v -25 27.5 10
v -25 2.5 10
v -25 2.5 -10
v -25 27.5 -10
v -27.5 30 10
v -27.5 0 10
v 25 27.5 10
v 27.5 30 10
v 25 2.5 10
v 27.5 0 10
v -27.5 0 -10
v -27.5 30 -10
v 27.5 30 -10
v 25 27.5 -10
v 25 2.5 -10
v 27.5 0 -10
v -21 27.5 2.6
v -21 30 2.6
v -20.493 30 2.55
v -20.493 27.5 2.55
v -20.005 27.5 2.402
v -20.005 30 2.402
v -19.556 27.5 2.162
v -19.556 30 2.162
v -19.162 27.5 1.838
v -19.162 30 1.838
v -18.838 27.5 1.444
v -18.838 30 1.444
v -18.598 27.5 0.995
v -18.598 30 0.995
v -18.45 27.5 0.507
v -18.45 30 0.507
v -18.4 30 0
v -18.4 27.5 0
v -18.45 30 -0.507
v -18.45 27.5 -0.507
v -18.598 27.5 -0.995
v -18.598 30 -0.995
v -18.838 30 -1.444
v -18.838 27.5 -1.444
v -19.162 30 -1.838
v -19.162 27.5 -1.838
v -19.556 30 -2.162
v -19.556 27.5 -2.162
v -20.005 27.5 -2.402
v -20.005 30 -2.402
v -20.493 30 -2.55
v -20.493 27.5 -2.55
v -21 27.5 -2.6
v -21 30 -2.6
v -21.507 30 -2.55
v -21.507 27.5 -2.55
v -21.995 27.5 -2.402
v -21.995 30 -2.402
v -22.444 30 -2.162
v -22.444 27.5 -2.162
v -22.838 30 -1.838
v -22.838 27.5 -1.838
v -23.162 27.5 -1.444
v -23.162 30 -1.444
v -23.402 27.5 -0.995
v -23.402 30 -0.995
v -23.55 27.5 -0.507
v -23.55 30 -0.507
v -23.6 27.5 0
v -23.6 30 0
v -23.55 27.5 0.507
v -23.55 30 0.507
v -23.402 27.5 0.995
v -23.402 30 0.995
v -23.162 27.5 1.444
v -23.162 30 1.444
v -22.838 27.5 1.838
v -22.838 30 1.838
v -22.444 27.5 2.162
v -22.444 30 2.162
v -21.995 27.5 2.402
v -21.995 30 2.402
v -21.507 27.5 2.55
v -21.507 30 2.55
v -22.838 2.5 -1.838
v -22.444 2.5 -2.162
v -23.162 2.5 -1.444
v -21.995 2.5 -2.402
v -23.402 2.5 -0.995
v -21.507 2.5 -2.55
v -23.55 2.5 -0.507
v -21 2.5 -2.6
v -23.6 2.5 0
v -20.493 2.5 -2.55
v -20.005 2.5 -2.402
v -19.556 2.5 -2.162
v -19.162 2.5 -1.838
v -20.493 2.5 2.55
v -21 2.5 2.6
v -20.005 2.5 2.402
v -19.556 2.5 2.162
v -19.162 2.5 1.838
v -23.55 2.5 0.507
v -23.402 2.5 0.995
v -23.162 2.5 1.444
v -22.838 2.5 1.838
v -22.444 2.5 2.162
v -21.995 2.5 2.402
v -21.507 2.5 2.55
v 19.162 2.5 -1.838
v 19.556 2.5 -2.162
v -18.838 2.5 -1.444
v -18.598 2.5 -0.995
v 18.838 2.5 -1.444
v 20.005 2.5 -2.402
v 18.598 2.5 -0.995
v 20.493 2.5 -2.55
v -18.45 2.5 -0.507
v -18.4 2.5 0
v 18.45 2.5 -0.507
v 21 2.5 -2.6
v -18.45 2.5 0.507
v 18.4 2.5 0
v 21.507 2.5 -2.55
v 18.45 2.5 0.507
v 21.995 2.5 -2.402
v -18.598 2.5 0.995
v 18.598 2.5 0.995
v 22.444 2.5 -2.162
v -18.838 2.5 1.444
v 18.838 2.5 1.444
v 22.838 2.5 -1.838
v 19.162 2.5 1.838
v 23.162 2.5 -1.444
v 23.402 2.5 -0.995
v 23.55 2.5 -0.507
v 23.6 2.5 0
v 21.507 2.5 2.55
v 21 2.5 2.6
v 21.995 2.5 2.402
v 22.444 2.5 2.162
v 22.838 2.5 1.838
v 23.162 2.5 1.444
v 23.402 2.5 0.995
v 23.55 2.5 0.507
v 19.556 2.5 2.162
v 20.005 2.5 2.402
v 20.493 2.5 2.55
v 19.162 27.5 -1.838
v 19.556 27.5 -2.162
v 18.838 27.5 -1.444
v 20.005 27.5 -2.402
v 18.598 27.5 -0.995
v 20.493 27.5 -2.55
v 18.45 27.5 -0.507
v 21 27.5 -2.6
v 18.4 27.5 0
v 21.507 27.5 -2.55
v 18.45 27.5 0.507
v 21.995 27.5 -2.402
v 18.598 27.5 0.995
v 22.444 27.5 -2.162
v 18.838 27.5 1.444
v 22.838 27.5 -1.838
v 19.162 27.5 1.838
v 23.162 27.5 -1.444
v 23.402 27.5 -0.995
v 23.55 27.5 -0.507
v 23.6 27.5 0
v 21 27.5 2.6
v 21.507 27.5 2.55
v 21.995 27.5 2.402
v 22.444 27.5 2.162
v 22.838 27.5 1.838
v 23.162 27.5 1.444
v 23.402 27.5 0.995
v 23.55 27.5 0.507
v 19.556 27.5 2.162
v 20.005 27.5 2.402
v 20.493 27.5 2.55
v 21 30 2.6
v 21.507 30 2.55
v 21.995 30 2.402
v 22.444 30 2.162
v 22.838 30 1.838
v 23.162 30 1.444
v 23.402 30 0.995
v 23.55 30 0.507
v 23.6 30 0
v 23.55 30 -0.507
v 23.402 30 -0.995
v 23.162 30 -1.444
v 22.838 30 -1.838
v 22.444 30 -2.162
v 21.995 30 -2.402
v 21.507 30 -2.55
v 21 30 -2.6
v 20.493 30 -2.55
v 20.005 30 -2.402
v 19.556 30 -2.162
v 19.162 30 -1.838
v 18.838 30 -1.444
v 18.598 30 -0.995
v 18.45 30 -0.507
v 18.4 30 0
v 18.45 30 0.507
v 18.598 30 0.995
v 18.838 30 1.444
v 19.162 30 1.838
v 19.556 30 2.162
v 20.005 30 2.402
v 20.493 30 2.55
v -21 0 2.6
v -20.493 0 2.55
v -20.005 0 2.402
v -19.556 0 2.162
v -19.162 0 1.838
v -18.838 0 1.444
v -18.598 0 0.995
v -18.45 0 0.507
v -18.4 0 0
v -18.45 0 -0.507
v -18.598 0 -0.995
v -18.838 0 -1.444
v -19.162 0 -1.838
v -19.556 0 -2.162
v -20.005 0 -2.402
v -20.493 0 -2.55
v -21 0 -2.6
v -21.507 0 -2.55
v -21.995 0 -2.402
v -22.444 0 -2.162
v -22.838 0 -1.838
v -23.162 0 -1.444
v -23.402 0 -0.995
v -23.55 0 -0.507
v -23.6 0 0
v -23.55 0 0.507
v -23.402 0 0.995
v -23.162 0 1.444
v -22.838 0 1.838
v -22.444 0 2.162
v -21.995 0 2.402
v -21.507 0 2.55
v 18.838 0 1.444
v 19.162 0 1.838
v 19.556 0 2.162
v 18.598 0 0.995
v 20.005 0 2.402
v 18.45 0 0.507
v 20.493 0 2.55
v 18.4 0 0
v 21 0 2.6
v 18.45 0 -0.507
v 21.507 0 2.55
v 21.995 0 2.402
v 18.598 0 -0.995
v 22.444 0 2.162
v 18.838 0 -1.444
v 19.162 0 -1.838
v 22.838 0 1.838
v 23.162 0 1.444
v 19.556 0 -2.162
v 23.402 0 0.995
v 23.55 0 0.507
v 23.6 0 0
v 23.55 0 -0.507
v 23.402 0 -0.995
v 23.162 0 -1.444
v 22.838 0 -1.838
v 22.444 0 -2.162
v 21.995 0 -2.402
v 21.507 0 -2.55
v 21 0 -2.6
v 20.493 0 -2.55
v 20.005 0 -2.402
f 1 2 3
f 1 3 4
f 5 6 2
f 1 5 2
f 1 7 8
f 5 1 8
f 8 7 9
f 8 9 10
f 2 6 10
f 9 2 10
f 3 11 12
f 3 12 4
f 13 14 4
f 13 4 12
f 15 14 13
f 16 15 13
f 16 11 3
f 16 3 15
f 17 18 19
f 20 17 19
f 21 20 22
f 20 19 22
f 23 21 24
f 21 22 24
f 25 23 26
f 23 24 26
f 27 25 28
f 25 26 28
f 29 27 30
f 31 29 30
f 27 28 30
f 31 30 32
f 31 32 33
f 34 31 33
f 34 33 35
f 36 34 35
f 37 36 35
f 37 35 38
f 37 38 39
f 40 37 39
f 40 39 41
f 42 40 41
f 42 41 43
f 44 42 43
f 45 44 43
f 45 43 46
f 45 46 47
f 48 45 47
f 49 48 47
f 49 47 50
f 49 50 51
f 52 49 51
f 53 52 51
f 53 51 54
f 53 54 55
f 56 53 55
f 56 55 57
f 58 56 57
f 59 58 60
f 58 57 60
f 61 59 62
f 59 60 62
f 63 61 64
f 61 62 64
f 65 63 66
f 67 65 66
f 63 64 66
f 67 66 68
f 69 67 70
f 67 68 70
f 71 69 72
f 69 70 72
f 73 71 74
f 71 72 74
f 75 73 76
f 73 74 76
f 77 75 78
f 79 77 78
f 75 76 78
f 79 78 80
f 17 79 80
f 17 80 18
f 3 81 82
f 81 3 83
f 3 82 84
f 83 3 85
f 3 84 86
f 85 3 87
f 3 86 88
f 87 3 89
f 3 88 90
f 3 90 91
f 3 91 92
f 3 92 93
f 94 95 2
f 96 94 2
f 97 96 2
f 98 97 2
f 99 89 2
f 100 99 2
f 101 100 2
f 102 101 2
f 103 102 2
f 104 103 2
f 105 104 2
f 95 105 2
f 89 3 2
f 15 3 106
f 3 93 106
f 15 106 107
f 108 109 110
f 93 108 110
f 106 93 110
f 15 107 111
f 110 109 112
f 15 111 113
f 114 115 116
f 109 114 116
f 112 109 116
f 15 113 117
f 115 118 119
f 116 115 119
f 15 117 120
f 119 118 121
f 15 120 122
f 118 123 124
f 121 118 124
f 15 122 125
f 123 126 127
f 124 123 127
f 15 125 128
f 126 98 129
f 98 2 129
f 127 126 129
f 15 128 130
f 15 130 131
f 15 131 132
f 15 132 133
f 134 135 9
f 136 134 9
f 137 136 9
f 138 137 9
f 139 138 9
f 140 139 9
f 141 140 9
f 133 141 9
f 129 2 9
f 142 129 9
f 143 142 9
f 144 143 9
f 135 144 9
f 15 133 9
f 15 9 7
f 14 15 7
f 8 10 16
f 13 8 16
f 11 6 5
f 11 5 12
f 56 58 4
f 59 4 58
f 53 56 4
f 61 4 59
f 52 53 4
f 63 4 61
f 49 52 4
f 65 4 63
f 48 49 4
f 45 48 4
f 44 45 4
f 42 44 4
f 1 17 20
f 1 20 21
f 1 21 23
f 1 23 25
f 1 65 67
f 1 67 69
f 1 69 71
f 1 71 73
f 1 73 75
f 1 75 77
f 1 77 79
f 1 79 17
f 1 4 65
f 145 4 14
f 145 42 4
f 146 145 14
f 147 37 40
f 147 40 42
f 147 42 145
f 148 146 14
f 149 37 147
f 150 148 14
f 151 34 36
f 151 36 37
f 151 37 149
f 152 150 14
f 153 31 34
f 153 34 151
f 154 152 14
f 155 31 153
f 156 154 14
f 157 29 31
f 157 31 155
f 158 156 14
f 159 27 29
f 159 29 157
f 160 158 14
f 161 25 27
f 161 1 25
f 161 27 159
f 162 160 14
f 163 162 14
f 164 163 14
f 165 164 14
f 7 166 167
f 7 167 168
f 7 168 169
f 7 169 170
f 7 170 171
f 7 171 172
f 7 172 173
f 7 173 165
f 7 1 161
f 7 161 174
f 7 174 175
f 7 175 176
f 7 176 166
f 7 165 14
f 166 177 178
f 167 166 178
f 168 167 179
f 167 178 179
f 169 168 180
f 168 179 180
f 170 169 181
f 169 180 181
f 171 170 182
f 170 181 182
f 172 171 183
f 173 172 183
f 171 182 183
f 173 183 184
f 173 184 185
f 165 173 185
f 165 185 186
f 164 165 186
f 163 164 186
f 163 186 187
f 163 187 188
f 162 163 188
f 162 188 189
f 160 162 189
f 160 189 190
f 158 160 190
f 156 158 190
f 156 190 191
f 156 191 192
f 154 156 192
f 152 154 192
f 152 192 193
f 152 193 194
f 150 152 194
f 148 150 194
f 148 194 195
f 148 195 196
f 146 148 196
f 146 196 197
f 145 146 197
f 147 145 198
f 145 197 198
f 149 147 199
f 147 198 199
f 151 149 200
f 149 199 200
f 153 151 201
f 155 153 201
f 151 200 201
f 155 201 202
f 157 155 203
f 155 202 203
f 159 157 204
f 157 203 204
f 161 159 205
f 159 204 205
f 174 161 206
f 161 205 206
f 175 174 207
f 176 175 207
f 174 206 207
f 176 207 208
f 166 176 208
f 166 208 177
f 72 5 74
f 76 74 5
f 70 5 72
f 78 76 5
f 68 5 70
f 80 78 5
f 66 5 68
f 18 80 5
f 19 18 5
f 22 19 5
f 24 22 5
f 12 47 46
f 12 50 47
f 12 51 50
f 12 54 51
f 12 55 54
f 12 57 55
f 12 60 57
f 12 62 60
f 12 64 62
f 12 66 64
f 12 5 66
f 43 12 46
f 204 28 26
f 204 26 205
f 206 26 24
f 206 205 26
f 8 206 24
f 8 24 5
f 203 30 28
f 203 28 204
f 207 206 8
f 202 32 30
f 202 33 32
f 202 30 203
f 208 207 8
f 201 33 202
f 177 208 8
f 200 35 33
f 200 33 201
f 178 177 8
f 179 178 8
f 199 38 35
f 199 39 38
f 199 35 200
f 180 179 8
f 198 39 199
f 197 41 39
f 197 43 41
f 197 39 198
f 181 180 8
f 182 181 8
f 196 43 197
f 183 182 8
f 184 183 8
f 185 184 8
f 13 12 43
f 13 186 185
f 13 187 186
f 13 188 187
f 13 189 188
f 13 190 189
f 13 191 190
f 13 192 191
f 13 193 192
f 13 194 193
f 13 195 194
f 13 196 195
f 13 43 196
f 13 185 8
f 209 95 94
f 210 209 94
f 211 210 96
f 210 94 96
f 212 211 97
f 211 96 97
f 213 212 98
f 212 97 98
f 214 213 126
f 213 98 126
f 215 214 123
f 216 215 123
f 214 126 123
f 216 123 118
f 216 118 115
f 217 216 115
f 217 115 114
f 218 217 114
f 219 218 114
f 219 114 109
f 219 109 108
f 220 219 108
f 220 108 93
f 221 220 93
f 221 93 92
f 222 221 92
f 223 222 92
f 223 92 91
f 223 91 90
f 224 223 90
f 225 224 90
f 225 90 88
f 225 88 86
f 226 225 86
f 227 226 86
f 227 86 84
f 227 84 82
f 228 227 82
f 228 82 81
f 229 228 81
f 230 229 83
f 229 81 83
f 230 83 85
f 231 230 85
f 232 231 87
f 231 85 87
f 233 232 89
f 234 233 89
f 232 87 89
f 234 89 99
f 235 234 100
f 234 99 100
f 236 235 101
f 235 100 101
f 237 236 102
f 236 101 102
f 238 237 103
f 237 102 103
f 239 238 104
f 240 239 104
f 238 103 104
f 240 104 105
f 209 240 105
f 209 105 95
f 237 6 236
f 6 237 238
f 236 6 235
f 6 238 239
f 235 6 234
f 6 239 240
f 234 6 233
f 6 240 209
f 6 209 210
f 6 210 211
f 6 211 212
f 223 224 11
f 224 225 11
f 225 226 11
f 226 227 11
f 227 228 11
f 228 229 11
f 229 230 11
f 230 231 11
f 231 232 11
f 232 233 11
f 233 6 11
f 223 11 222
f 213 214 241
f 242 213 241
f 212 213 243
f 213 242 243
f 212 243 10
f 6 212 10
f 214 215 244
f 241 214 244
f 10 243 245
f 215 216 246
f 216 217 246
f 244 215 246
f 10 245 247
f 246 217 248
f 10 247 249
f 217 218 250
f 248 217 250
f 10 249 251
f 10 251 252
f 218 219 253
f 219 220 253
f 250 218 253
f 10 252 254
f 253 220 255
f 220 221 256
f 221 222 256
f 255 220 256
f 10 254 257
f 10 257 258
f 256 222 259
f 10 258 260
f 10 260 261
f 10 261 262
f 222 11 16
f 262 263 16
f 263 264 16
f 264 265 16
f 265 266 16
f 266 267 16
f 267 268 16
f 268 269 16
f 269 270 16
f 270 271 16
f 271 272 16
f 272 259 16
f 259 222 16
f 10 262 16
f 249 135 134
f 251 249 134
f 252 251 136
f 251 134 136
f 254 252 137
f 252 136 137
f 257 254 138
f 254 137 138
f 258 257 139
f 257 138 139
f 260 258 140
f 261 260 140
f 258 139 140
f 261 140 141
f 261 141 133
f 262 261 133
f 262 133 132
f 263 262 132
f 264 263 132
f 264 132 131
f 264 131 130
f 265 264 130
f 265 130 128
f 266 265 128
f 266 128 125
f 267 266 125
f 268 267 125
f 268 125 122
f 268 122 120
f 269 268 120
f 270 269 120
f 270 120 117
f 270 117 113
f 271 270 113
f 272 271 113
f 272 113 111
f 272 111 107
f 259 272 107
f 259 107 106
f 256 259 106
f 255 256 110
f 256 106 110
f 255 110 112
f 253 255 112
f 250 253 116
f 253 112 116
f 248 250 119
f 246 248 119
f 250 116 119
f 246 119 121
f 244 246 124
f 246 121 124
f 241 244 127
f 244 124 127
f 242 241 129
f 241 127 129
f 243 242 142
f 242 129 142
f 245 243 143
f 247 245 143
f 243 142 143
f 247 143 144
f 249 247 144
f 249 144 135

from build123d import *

# Parameters (mm, degrees)
SKETCH_1_W          = 55
SKETCH_1_H          = 20
EXTRUDE_1_DEPTH     = 30
CUT_EXTRUDE_1_REACH = 47.346
SKETCH_2_W          = 50
SKETCH_2_H          = 25
CUT_EXTRUDE_2_REACH = 43.908
SKETCH_3_R          = 2.6


with BuildPart() as part:
    # 草图1 → 凸台-拉伸1 (new body)
    with BuildSketch(Plane(origin=(0, 0, 0), x_dir=(1, 0, 0), z_dir=(0, 1, 0))):
        Rectangle(SKETCH_1_W, SKETCH_1_H)
    extrude(amount=EXTRUDE_1_DEPTH)

    # 草图2 → 切除-拉伸1 (cut, up to next)
    with BuildSketch(Plane.XY.offset(10), mode=Mode.PRIVATE) as cut_extrude_1_sk1:
        with Locations((0, 15)):
            Rectangle(SKETCH_2_W, SKETCH_2_H)
    cut_extrude_1_tool1 = extrude(cut_extrude_1_sk1.sketch, amount=-CUT_EXTRUDE_1_REACH, mode=Mode.PRIVATE) & part.part
    add(cut_extrude_1_tool1.solids().sort_by_distance((0, 15, 10))[0], mode=Mode.SUBTRACT)

    # 切除-拉伸2: up to this face of the body (flat: up to its plane)
    cut_extrude_2_end = Plane(part.part.faces().sort_by_distance((0, 0, 0))[0])
    # 草图3 → 切除-拉伸2 (cut, up to the picked face)
    with BuildSketch(Plane(origin=(0, 30, 0), x_dir=(1, 0, 0), z_dir=(0, 1, 0)), mode=Mode.PRIVATE) as cut_extrude_2_sk1:
        with Locations(Location((-21, 0, 0), (0, 0, 270))):
            Circle(SKETCH_3_R)
    cut_extrude_2_tool1 = split(extrude(cut_extrude_2_sk1.sketch, amount=-CUT_EXTRUDE_2_REACH, mode=Mode.PRIVATE), bisect_by=cut_extrude_2_end, keep=Keep.BOTH, mode=Mode.PRIVATE)
    # 草图3 → 切除-拉伸2 (cut, up to the picked face)
    with BuildSketch(Plane(origin=(0, 30, 0), x_dir=(1, 0, 0), z_dir=(0, 1, 0)), mode=Mode.PRIVATE) as cut_extrude_2_sk2:
        with Locations(Location((21, 0, 0), (0, 0, 270))):
            Circle(SKETCH_3_R)
    cut_extrude_2_tool2 = split(extrude(cut_extrude_2_sk2.sketch, amount=-CUT_EXTRUDE_2_REACH, mode=Mode.PRIVATE), bisect_by=cut_extrude_2_end, keep=Keep.BOTH, mode=Mode.PRIVATE)
    add(cut_extrude_2_tool1.solids().sort_by(Axis((-21, 30, 0), (0, -1, 0)))[0], mode=Mode.SUBTRACT)
    add(cut_extrude_2_tool2.solids().sort_by(Axis((21, 30, 0), (0, -1, 0)))[0], mode=Mode.SUBTRACT)


solid = part.part
